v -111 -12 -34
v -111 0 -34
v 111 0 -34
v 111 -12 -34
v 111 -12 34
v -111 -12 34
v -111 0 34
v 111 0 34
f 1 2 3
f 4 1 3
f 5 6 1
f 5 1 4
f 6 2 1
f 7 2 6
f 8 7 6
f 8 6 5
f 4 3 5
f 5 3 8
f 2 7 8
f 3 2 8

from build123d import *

# Parameters (mm, degrees)
F0_W      = 222
F0_H      = 68
F1_DEPTH  = 12
F2_W      = 3
F2_H      = 2.2371114204
F3_DEPTH  = 2230
F5_W      = 222
F5_H      = 68
F6_DEPTH  = 12
F7_W      = 3
F7_H      = 6.3245725577
F8_DEPTH  = 25.4
F9_W      = 3
F9_H      = 3
F10_DEPTH = 300
F11_W     = 3
F11_H     = 6.3245725577
F12_DEPTH = 12
F15_W     = 222
F15_H     = 68
F16_DEPTH = 12


with BuildPart() as f1:
    # F0 (on Right) → F1 (new body)
    with BuildSketch(Plane.YZ):
        Rectangle(F0_W, F0_H)
    extrude(amount=F1_DEPTH)

    # F2 (on face) → F3 (cut)
    with BuildSketch(Plane.XZ.offset(111)):
        with Locations((1.5, 22.7592512513)):
            Rectangle(F2_W, F2_H)
    extrude(amount=-F3_DEPTH, mode=Mode.SUBTRACT)


with BuildPart() as f6:
    # F5 (on Right) → F6 (new body)
    with BuildSketch(Plane.YZ):
        Rectangle(F5_W, F5_H)
    extrude(amount=F6_DEPTH)

    # F7 (on face) → F8 (cut)
    with BuildSketch(Plane(origin=(0, 0, 0), x_dir=(0, -1, 0), z_dir=(-1, 0, 0))):
        with Locations((-99.5, 30.8377137212)):
            Rectangle(F7_W, F7_H)
    extrude(amount=-F8_DEPTH, mode=Mode.SUBTRACT)

    # F9 (on face) → F10 (cut)
    with BuildSketch(Plane.XZ.offset(111)):
        with Locations((10.5, 22.5)):
            Rectangle(F9_W, F9_H)
    extrude(amount=-F10_DEPTH, mode=Mode.SUBTRACT)


with BuildPart() as f12:
    # F11 (on face) → F12 (new body)
    with BuildSketch(Plane.YZ.offset(12)):
        with Locations((99.5, 30.8377137212)):
            Rectangle(F11_W, F11_H)
    extrude(amount=-F12_DEPTH)


with BuildPart() as f16:
    # F15 (on Front) → F16 (new body)
    with BuildSketch(Plane.XZ):
        Rectangle(F15_W, F15_H)
    extrude(amount=F16_DEPTH)


solid = f16.part
